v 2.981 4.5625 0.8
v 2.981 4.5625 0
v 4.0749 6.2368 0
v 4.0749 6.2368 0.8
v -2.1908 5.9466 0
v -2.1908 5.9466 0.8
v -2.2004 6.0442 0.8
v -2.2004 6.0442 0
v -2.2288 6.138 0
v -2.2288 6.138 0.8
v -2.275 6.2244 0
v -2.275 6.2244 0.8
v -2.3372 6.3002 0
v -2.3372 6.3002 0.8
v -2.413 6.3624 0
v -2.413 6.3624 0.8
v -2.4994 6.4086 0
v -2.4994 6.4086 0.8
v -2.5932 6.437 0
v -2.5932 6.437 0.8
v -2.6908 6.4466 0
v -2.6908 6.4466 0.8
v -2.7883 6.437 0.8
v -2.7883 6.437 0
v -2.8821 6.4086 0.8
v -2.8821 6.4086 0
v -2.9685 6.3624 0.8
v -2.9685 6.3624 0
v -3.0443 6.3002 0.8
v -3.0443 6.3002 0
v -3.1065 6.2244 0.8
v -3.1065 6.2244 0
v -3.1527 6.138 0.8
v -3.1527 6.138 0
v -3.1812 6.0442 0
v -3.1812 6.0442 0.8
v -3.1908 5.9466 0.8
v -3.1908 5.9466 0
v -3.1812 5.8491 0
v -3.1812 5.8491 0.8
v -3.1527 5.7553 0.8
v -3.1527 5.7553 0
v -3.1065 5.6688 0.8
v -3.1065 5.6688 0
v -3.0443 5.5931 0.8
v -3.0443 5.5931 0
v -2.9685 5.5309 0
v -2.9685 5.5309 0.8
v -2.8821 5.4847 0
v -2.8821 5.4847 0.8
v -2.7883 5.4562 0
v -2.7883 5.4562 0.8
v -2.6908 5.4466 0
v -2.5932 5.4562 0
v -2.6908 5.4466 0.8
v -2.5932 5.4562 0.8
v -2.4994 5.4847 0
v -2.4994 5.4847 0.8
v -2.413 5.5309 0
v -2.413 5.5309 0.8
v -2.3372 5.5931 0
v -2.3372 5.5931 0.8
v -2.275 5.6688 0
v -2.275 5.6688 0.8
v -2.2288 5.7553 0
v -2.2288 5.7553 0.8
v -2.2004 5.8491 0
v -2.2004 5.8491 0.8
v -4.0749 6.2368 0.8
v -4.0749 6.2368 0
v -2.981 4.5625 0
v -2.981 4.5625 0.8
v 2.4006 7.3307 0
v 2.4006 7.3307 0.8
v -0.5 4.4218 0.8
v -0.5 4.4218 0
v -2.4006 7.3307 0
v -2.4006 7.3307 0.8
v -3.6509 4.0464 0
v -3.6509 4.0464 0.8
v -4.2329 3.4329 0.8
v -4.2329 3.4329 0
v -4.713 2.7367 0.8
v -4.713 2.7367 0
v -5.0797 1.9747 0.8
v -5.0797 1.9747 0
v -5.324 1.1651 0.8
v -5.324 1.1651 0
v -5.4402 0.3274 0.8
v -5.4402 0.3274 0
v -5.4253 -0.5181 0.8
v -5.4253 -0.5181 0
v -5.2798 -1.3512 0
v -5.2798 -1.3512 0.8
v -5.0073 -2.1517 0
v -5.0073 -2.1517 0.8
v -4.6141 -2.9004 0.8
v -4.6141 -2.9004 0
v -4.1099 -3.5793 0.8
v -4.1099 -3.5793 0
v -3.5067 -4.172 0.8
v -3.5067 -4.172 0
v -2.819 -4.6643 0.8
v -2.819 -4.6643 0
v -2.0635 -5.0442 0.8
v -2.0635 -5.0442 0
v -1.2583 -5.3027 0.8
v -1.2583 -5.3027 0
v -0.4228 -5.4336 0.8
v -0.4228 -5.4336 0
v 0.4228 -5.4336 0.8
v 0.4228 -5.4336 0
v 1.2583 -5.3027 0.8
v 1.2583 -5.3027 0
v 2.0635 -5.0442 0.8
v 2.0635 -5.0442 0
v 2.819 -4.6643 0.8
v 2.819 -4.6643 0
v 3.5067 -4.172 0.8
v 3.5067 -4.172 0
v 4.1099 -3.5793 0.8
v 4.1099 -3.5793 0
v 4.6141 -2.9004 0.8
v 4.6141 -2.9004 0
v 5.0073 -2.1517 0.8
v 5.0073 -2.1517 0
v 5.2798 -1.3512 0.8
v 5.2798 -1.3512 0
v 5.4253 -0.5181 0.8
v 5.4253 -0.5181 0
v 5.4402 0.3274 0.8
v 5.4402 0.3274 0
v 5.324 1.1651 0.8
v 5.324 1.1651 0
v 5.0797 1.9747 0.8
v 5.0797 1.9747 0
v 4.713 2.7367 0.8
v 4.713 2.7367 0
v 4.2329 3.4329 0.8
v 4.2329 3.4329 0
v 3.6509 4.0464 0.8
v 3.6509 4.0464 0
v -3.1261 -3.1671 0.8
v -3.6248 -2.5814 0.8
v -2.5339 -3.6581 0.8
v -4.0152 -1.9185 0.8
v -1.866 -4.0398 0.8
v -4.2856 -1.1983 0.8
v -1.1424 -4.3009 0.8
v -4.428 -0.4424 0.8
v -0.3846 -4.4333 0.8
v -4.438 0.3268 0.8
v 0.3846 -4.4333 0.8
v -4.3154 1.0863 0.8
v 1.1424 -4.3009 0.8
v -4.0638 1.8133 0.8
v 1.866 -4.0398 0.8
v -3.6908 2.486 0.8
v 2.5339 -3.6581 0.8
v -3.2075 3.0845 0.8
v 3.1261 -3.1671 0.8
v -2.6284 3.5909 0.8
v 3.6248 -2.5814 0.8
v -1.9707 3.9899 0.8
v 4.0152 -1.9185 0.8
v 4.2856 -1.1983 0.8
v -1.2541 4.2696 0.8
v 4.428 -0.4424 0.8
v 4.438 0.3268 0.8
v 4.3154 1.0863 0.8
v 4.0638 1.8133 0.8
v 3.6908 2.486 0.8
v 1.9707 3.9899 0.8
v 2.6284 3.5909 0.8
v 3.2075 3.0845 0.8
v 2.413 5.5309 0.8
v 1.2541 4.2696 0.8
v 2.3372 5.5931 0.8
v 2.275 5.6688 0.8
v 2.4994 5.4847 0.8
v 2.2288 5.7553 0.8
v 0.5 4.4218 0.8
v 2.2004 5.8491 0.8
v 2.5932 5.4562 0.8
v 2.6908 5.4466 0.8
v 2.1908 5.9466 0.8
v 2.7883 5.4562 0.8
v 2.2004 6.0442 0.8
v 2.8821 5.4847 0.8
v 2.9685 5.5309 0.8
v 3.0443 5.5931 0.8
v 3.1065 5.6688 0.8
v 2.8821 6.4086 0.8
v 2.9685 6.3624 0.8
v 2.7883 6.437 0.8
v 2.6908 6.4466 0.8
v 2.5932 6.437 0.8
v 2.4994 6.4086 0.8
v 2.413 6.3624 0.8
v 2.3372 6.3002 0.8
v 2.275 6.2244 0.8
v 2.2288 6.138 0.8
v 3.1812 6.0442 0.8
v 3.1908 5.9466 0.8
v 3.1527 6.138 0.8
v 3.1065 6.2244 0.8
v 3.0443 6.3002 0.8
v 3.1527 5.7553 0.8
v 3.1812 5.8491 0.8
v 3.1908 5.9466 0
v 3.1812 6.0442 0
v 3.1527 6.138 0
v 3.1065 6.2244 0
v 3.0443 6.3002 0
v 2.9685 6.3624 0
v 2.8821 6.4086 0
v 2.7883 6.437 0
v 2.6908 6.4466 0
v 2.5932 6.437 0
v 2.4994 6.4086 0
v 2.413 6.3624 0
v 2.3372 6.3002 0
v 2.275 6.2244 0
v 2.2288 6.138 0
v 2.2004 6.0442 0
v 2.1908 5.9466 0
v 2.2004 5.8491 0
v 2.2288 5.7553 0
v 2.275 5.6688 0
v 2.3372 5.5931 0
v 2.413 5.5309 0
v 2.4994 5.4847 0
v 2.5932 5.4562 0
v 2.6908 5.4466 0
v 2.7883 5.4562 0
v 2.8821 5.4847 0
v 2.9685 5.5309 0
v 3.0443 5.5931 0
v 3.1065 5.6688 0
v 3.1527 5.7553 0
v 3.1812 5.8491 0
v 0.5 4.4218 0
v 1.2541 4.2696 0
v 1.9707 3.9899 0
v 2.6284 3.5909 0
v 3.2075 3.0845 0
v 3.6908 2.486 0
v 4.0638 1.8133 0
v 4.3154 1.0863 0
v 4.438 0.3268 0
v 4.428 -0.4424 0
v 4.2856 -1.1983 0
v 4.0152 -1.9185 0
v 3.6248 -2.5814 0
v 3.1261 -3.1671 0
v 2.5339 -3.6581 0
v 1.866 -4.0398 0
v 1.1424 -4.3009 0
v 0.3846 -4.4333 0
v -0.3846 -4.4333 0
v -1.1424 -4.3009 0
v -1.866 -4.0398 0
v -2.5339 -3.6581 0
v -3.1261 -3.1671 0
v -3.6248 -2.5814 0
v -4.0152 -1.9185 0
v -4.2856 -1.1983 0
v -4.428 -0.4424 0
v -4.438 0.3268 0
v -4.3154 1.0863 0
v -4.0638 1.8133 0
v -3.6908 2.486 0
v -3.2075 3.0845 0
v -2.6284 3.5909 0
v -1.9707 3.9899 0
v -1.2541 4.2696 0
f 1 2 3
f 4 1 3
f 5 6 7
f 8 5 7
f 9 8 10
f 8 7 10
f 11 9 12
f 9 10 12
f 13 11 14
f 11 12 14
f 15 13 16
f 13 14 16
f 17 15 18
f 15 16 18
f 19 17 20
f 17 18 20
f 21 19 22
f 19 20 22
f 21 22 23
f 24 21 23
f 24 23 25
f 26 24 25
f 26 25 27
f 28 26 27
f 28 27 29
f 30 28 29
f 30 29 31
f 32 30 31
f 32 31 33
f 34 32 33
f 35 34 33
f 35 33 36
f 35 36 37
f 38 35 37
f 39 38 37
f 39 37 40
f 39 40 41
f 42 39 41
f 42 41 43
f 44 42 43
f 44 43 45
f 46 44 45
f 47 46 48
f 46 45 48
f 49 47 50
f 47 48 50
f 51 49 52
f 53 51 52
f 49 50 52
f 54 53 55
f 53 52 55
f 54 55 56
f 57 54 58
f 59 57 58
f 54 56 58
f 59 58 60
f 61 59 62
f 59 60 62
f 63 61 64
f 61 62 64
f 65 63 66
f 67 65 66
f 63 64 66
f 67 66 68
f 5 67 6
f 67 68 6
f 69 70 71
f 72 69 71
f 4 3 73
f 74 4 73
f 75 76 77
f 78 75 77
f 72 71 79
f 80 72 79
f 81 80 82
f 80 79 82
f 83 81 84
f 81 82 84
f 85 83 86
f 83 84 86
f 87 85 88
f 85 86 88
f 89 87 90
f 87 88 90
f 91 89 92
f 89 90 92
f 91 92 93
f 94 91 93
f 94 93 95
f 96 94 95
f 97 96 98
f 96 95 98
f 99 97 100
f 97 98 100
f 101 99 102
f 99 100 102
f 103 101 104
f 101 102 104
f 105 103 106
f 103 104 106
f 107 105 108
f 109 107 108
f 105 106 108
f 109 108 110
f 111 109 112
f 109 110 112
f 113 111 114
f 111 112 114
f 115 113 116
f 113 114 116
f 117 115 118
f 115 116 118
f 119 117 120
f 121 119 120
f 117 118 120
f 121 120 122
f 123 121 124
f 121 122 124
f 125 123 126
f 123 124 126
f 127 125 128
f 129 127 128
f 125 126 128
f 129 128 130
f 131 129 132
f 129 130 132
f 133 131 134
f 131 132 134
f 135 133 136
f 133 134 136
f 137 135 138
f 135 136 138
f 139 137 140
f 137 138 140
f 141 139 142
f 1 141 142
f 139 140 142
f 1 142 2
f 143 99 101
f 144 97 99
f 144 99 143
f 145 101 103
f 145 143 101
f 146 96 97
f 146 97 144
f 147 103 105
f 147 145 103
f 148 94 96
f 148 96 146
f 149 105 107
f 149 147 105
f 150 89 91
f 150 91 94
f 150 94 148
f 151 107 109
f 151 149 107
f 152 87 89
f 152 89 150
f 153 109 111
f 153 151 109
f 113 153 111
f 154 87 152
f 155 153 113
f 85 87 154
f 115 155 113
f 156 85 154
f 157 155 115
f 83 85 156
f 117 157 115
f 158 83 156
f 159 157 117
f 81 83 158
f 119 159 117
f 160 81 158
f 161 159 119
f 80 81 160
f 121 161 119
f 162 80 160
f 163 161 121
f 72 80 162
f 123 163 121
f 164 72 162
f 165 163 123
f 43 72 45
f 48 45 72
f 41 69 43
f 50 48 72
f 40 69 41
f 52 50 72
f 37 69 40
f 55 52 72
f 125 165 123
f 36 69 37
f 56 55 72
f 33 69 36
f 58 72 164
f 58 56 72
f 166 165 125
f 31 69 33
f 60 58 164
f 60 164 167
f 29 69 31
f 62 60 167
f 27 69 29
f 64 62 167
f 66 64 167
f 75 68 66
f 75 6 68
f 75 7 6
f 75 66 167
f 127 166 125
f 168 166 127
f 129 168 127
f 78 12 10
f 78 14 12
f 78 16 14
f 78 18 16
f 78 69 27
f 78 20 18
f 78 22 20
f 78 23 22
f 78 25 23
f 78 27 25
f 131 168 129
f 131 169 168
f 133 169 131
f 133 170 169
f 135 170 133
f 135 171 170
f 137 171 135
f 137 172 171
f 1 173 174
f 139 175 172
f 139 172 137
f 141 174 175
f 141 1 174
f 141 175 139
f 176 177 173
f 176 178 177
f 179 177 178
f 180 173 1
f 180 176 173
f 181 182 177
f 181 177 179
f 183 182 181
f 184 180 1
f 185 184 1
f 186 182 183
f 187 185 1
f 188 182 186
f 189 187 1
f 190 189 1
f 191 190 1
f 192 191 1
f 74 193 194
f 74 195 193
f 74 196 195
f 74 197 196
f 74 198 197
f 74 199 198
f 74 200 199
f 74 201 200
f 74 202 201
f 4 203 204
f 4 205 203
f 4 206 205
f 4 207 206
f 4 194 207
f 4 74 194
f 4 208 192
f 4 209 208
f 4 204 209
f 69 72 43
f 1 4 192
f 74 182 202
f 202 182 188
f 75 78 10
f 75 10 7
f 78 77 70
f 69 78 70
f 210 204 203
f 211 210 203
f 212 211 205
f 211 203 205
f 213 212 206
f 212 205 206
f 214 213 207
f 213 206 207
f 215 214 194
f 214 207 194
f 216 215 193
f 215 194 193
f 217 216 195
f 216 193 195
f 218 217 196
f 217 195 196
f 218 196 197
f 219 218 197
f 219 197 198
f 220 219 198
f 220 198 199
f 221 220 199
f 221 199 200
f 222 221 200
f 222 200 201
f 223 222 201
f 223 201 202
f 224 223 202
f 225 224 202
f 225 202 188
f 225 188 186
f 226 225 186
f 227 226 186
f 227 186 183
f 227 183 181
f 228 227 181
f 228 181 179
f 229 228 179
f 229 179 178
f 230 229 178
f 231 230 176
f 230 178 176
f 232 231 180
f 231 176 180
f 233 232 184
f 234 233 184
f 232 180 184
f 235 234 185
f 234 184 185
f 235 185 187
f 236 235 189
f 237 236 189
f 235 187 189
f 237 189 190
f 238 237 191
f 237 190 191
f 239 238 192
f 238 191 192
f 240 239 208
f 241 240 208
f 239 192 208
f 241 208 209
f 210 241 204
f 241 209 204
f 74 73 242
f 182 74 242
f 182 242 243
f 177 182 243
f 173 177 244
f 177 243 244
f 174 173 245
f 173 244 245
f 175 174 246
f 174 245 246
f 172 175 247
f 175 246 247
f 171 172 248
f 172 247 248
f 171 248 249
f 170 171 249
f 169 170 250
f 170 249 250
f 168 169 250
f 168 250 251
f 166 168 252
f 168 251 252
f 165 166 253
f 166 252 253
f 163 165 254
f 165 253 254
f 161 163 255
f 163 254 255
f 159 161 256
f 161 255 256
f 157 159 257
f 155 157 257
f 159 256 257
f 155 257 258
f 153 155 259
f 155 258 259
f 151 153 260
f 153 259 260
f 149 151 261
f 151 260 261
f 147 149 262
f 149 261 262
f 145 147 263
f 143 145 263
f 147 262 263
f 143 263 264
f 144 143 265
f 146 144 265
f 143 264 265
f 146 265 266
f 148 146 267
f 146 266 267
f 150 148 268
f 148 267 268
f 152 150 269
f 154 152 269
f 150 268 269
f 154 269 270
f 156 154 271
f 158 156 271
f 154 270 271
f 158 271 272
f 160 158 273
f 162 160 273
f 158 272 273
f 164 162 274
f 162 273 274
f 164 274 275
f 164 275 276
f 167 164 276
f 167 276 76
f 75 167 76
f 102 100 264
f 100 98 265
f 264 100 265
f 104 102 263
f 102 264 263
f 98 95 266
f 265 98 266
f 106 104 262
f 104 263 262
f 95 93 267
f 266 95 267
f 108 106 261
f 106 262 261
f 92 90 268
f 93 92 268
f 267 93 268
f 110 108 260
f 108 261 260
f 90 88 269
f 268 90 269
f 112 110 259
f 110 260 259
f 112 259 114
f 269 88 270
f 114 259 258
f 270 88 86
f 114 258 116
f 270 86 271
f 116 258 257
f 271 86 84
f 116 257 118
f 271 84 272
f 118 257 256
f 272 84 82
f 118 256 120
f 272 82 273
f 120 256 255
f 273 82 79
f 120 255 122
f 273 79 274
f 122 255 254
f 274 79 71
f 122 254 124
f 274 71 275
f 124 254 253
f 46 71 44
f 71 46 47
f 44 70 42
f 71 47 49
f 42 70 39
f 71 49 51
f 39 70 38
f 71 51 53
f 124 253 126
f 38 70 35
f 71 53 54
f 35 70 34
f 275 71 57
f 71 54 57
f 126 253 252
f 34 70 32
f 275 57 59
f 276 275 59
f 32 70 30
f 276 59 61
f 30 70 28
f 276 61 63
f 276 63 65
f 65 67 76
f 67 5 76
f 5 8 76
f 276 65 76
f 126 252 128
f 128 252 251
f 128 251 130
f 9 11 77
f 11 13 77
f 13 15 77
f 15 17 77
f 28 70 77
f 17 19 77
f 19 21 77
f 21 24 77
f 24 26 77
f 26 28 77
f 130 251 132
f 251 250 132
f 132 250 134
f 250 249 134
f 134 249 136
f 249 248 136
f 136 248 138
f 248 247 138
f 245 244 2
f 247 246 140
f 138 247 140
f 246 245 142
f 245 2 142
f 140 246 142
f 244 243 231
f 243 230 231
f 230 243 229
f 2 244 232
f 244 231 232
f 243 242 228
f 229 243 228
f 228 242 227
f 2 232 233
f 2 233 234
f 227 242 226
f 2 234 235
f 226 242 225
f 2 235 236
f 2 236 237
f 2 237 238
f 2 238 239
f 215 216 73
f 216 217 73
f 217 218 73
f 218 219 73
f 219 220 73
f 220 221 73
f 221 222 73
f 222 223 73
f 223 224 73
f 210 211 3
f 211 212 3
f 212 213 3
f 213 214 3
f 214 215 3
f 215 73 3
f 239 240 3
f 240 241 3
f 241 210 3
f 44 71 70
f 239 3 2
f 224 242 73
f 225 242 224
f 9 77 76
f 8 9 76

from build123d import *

# Parameters (mm, degrees)
BOSS_EXTRUDE1_DEPTH = 0.8
SKETCH3_R           = 0.5
CUT_EXTRUDE1_DEPTH  = 1.8


with BuildPart() as part:
    # Sketch2 → Boss-Extrude1 (new body)
    with BuildSketch(Plane.XY):
        with BuildLine():
            Line((-4.074883717, 6.236811902), (-2.980955202, 4.562499982))
            ThreePointArc((-2.980955202, 4.562499982), (0, -5.45), (2.980955202, 4.562499982))
            Line((2.980955202, 4.562499982), (4.074883717, 6.236811902))
            Line((4.074883717, 6.236811902), (2.400571797, 7.330740416))
            Line((2.400571797, 7.330740416), (0.5, 4.421820892))
            ThreePointArc((0.5, 4.421820892), (0, -4.45), (-0.5, 4.421820892))
            Line((-0.5, 4.421820892), (-2.400571797, 7.330740416))
            Line((-2.400571797, 7.330740416), (-4.074883717, 6.236811902))
        make_face()
    extrude(amount=BOSS_EXTRUDE1_DEPTH)

    # Sketch3 → Cut-Extrude1 (cut, through all)
    with BuildSketch(Plane.XY.offset(0.8)):
        with Locations((-2.6907635, 5.946620199)):
            Circle(SKETCH3_R)
        with Locations((2.6907635, 5.946620199)):
            Circle(SKETCH3_R)
    extrude(amount=-CUT_EXTRUDE1_DEPTH, mode=Mode.SUBTRACT)


solid = part.part
